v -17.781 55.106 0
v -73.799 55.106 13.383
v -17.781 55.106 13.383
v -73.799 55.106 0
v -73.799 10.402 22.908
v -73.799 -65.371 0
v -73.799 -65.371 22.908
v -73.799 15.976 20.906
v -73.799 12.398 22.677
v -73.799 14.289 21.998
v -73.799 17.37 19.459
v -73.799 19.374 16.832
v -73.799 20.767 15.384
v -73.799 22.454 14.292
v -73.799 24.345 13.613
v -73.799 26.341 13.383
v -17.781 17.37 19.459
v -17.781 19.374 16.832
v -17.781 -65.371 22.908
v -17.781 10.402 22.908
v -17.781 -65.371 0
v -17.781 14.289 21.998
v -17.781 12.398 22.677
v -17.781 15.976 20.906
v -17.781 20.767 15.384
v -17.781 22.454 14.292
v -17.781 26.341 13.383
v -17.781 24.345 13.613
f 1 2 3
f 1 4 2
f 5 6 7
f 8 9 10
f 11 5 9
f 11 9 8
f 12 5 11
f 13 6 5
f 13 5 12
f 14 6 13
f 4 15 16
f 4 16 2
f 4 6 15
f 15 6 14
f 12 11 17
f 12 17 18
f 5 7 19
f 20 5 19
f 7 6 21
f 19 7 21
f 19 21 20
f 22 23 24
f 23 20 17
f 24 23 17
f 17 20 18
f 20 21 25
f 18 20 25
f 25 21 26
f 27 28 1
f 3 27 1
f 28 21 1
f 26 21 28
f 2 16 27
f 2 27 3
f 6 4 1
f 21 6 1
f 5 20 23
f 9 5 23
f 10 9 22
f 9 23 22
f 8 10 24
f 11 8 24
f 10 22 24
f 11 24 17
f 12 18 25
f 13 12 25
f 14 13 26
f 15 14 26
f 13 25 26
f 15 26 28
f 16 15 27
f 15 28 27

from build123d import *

# Parameters (mm, degrees)
SKETCH1_W           = 56.017642274
SKETCH1_H           = 120.476854835
BOSS_EXTRUDE1_DEPTH = 22.907839
CUT_EXTRUDE1_DEPTH  = 56.017642


with BuildPart() as part:
    # Sketch1 → Boss-Extrude1 (new body)
    with BuildSketch(Plane.XY):
        with Locations((-45.790278616, -5.132568266)):
            Rectangle(SKETCH1_W, SKETCH1_H)
    extrude(amount=BOSS_EXTRUDE1_DEPTH)

    # Sketch2 → Cut-Extrude1 (cut)
    with BuildSketch(Plane(origin=(-17.781457479, 0, 0), x_dir=(0, 0, -1), z_dir=(1, 0, 0))):
        with BuildLine():
            ThreePointArc((-16.831723704, 19.373649849), (-14.292248498, 22.454133795), (-13.382838726, 26.341458007))
            Line((-13.382838726, 26.341458007), (-13.382838726, 55.105859152))
            Line((-13.382838726, 55.105859152), (-22.907838726, 55.105859152))
            Line((-22.907838726, 55.105859152), (-22.907838726, 10.40214091))
            ThreePointArc((-22.907838726, 10.40214091), (-21.998428954, 14.289465122), (-19.458953748, 17.369949068))
            Line((-19.458953748, 17.369949068), (-16.831723704, 19.373649849))
        make_face()
    extrude(amount=-CUT_EXTRUDE1_DEPTH, mode=Mode.SUBTRACT)


solid = part.part
